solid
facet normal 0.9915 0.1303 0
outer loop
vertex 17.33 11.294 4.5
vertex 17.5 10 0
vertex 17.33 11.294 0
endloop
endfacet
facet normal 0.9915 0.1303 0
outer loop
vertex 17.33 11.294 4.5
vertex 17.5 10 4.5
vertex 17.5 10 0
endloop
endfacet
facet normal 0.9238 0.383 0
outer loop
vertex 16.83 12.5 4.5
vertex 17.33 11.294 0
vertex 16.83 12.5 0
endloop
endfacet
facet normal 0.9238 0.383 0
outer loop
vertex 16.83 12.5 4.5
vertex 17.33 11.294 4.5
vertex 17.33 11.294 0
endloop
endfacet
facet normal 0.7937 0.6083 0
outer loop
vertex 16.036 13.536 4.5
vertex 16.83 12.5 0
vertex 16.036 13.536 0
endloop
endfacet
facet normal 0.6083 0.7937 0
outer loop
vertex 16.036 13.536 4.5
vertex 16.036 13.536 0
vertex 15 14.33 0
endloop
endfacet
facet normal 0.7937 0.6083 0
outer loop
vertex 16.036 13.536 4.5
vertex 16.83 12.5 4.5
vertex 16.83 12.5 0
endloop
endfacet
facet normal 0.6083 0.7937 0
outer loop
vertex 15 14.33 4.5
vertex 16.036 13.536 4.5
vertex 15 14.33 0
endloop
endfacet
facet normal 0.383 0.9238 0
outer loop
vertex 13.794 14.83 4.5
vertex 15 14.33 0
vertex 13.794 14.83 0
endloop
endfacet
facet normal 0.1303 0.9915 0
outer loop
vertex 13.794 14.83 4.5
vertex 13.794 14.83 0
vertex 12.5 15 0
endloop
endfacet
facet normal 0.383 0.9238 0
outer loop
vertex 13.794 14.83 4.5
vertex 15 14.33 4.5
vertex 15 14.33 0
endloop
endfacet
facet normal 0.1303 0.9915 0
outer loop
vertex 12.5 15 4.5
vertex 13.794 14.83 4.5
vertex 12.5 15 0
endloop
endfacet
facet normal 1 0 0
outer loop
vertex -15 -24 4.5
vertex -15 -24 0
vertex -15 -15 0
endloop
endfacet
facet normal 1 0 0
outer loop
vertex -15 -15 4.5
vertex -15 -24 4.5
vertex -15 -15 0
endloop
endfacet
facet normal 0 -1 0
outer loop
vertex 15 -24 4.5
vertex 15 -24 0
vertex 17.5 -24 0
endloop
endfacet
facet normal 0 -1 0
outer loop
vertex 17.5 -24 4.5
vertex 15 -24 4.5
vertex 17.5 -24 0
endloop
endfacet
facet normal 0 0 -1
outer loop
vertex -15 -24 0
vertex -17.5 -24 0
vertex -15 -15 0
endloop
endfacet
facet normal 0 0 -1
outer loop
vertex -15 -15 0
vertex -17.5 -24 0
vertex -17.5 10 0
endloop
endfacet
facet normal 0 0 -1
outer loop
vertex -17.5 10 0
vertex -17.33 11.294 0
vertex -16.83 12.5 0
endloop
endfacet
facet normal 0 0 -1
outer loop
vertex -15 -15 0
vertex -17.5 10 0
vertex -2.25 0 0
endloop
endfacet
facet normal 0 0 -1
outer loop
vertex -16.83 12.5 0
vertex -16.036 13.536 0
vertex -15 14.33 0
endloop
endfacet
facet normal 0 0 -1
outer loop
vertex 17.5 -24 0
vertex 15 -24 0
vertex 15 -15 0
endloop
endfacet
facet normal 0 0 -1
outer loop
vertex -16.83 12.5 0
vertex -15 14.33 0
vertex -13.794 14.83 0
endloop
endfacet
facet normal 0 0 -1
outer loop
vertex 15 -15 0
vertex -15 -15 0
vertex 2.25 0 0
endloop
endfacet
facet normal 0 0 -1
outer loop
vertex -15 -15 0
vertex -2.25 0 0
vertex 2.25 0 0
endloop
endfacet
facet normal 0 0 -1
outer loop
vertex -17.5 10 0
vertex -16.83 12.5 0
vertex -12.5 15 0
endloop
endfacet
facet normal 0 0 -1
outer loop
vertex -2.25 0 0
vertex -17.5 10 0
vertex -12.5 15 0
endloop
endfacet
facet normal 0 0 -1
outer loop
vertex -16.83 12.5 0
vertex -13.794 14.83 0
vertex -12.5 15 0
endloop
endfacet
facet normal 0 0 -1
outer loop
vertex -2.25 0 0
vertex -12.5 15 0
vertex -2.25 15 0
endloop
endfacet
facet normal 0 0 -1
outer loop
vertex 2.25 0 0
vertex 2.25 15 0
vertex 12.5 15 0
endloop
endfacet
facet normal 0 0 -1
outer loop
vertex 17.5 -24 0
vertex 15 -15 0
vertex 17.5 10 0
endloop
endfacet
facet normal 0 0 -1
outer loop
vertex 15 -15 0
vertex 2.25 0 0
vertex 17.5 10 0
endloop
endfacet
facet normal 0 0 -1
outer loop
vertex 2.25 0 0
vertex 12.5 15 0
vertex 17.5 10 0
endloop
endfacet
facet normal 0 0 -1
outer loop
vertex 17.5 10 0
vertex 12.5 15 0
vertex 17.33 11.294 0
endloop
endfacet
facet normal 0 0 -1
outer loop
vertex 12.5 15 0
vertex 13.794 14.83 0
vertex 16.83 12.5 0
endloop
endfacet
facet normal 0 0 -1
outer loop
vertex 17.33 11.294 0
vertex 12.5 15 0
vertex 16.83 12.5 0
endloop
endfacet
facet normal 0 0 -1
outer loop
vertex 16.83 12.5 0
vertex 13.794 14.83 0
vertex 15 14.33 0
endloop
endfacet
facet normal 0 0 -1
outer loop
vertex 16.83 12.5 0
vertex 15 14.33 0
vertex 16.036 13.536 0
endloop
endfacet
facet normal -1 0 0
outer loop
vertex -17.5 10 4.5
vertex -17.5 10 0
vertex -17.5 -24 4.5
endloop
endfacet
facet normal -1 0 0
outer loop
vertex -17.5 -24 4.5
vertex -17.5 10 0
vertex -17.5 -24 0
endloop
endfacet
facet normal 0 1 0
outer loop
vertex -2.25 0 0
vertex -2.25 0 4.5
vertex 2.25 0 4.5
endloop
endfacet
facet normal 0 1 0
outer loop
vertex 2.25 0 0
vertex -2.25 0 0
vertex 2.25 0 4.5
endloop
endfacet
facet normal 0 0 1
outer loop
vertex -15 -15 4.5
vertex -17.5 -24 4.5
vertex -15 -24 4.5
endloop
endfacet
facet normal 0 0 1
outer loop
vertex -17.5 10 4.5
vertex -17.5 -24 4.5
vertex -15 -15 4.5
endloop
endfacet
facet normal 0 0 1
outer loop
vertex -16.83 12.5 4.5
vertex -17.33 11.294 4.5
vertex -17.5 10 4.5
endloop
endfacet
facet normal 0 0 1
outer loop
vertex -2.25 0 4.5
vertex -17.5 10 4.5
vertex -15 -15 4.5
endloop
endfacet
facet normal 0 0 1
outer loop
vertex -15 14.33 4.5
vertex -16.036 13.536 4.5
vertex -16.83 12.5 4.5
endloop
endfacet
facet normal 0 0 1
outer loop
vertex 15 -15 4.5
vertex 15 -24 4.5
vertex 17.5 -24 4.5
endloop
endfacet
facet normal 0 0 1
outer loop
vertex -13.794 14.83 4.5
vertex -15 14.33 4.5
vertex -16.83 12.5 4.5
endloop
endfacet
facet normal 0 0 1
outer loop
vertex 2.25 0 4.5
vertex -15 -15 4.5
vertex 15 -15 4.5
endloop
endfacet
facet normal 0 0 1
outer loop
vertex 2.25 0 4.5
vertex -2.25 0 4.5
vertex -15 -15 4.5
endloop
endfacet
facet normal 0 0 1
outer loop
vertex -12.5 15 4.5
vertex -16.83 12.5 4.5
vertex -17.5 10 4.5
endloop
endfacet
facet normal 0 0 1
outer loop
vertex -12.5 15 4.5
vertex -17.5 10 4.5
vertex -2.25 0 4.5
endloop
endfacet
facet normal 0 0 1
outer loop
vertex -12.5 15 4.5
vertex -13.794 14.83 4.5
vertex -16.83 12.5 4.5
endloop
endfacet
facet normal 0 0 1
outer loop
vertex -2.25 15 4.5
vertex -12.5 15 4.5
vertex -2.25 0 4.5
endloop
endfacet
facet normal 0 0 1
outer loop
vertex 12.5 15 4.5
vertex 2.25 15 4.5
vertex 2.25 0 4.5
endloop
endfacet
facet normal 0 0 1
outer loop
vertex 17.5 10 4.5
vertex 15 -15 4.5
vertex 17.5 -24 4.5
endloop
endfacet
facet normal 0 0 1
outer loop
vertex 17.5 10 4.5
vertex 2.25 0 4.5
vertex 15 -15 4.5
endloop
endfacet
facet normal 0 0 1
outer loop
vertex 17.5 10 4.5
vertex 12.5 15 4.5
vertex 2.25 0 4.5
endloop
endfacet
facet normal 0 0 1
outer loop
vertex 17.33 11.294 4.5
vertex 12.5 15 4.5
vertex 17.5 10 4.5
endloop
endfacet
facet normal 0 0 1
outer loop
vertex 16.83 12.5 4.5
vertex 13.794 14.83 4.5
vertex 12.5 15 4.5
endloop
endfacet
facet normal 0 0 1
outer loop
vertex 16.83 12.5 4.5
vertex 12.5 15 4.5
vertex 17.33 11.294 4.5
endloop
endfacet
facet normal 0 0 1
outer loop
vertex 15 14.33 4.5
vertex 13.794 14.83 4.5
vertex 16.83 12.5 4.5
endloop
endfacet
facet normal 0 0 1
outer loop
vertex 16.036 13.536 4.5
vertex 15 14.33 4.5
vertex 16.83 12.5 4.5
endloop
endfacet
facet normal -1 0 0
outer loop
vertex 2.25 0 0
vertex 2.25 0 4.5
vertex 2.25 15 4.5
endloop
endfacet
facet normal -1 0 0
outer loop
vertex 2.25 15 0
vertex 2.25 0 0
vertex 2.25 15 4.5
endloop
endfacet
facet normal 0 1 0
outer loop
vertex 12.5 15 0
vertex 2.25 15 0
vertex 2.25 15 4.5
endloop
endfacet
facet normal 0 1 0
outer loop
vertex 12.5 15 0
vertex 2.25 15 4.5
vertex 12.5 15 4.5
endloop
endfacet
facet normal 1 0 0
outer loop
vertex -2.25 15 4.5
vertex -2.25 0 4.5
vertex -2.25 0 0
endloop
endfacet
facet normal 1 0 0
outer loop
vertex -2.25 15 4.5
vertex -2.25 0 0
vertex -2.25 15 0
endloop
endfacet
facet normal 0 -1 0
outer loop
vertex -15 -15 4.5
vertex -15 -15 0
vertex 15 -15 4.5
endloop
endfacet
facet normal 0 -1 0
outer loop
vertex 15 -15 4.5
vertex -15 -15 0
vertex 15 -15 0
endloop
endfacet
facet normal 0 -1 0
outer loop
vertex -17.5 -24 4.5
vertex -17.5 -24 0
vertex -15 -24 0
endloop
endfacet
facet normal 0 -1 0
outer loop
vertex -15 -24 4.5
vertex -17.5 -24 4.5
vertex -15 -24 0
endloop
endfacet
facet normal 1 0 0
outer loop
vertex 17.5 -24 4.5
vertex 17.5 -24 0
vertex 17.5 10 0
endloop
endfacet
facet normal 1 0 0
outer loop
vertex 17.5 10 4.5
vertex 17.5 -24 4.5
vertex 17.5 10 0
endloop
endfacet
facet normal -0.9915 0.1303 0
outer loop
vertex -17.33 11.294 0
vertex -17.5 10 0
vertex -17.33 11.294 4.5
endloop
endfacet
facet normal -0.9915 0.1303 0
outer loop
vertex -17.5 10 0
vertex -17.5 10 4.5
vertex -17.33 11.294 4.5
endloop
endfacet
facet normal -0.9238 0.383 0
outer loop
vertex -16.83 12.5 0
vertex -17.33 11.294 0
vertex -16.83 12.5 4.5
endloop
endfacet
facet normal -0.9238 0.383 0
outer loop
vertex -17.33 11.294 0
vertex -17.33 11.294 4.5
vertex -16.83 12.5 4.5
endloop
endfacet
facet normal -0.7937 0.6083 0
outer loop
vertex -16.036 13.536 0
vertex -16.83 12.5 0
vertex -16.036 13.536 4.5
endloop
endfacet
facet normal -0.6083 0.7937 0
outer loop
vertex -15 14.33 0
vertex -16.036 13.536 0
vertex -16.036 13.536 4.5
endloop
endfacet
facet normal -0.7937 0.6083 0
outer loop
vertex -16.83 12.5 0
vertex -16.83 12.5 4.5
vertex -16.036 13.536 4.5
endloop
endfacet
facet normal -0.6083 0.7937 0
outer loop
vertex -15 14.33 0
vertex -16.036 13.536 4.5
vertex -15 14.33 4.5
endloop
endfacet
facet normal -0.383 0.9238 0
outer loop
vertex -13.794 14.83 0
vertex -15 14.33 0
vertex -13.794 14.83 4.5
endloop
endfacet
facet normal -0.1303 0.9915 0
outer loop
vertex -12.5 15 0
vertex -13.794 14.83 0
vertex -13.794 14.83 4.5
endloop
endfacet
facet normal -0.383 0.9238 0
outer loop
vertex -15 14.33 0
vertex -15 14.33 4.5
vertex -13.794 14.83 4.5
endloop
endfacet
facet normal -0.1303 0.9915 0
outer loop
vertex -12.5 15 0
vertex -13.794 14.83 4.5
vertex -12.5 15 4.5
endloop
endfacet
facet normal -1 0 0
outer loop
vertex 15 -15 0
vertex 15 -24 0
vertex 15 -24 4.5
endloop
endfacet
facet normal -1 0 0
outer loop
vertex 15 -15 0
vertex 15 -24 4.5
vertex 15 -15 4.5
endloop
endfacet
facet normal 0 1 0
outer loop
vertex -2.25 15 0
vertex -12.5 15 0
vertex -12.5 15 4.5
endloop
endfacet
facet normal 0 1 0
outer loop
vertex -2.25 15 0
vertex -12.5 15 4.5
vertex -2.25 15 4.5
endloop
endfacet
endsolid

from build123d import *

# Parameters (mm, degrees)
SKETCH1_W           = 35
SKETCH1_H           = 30
SKETCH1_W_2         = 2.5
SKETCH1_H_2         = 9
BOSS_EXTRUDE1_DEPTH = 4.5
FILLET1_R           = 5
SKETCH2_W           = 4.5
SKETCH2_H           = 15
CUT_EXTRUDE1_DEPTH  = 4.5


with BuildPart() as part:
    # Sketch1 → Boss-Extrude1 (new body)
    with BuildSketch(Plane.XY):
        Rectangle(SKETCH1_W, SKETCH1_H)
        with Locations((-16.25, -19.5)):
            Rectangle(SKETCH1_W_2, SKETCH1_H_2)
        with Locations((16.25, -19.5)):
            Rectangle(SKETCH1_W_2, SKETCH1_H_2)
    extrude(amount=BOSS_EXTRUDE1_DEPTH)

    # Fillet1
    fillet1_edges = [part.edges().sort_by_distance(p)[0] for p in [
        (-17.5, 15, 2.25),
        (17.5, 15, 2.25),
    ]]
    fillet(fillet1_edges, radius=FILLET1_R)

    # Sketch2 → Cut-Extrude1 (cut)
    with BuildSketch(Plane.XY.offset(4.5)):
        with Locations((0, 7.5)):
            Rectangle(SKETCH2_W, SKETCH2_H)
    extrude(amount=-CUT_EXTRUDE1_DEPTH, mode=Mode.SUBTRACT)


solid = part.part
